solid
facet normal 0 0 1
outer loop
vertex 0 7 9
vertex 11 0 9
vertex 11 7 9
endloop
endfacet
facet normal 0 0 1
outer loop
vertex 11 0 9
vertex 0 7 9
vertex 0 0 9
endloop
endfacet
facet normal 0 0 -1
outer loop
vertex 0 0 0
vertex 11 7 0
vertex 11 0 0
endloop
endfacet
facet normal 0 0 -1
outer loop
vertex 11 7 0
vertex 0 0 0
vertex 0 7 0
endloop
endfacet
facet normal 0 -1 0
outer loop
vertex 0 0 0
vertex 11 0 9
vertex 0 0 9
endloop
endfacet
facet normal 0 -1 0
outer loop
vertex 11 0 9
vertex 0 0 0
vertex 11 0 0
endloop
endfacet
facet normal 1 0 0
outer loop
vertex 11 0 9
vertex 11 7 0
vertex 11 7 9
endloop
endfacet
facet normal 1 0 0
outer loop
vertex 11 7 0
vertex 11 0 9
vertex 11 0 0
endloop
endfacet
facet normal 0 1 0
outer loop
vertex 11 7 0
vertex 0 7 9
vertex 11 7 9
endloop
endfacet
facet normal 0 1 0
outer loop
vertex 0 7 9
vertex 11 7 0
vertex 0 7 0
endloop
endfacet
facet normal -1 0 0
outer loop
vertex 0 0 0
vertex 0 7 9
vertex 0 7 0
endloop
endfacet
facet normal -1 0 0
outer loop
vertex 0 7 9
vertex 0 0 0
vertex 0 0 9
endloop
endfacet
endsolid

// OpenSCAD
// Generated by SolidPython 1.0.1 on 2020-07-29 00:46:55


cube(size = [11, 7, 9]);
/***********************************************
*********      SolidPython code:      **********
************************************************
 
# import packages: SolidPython
from solid import *
from solid.utils import *
from itertools import chain, combinations, permutations


class Resize:

    def __init__(self, scad_file):
        self.scad_file = scad_file
        #self.scad_file = import_scad(scad_file)
        # cone/cylinder param:
        self.r1 = 0
        self.r2 = 0
        self.h = 0
        # rectangular prism param:
        self.w = 0
        self.l = 0
        # ellipse param:
        self.r = 0

    # import OpenScad code (file name corresponds to shape)


    # classify shape + parameters
    def assign(self, param1, param2, param3):
        if self.scad_file == 'cone.scad':
            self.r1 = param1
            self.r2 = param2
            self.h = param3
        elif self.scad_file == 'cylinder.scad':
            self.r1 = param1
            self.r2 = param2
            self.h = param3
        elif self.scad_file == 'rectangularPrism.scad':
            self.h = param1
            self.l = param2
            self.w = param3
        else:
            self.r = param1
            self.h = param2

    # resize parameters
    def iterate(self):
        x = range(3, 20, 2)
        i = 1
        if self.scad_file == 'cone.scad':
            tempList = list(permutations(x, 2))
            for temp in tempList:
                param1 = temp[0]
                param2 = temp[1]
                filepath = 'produced_scad_files/' + 'cone' + str(param1) + '_' + str(param2) + '_' + '.scad'
                scad_render_to_file(cylinder(h=param1, r1=param2, r2=0), filepath)

        elif self.scad_file == 'cylinder.scad':
            tempList = list(permutations(x, 3))
            for temp in tempList:
                param1 = temp[0]
                param2 = temp[1]
                filepath = 'produced_scad_files/' + 'cylinder' + str(param1) + '_' + str(param2) + '_' + '.scad'
                scad_render_to_file(cylinder(h=param1, r1=param2, r2=param2), filepath)

        elif self.scad_file == 'rectangularPrism.scad':
            tempList = list(permutations(x, 3))
            for temp in tempList:
                param1 = temp[0]
                param2 = temp[1]
                param3 = temp[2]
                filepath = 'produced_scad_files/' + 'rectangularPrism' + str(param1) + '_' + str(param2) + '_' + str(
                    param3) + '.scad'
                scad_render_to_file(cube(size=(param1, param2, param3)), filepath)

        elif self.scad_file == 'ellipse.scad':
            tempList = list(permutations(x, 4))
            for temp in tempList:
                param1 = temp[0]
                param2 = temp[1]
                param3 = temp[2]
                param4 = temp[3]
                filepath = 'produced_scad_files/' + 'ellipse' + str(param1) + '_' + str(param2) + '_' + str(param3) + '_' + str(param4) + '.scad'
                scad_render_to_file(scale([param1, param2, param3])(sphere(r=param4)), filepath)

    def render_to_scadfile(self):
        scad_render_to_file(scad, 'example.scad') 
 
************************************************/
